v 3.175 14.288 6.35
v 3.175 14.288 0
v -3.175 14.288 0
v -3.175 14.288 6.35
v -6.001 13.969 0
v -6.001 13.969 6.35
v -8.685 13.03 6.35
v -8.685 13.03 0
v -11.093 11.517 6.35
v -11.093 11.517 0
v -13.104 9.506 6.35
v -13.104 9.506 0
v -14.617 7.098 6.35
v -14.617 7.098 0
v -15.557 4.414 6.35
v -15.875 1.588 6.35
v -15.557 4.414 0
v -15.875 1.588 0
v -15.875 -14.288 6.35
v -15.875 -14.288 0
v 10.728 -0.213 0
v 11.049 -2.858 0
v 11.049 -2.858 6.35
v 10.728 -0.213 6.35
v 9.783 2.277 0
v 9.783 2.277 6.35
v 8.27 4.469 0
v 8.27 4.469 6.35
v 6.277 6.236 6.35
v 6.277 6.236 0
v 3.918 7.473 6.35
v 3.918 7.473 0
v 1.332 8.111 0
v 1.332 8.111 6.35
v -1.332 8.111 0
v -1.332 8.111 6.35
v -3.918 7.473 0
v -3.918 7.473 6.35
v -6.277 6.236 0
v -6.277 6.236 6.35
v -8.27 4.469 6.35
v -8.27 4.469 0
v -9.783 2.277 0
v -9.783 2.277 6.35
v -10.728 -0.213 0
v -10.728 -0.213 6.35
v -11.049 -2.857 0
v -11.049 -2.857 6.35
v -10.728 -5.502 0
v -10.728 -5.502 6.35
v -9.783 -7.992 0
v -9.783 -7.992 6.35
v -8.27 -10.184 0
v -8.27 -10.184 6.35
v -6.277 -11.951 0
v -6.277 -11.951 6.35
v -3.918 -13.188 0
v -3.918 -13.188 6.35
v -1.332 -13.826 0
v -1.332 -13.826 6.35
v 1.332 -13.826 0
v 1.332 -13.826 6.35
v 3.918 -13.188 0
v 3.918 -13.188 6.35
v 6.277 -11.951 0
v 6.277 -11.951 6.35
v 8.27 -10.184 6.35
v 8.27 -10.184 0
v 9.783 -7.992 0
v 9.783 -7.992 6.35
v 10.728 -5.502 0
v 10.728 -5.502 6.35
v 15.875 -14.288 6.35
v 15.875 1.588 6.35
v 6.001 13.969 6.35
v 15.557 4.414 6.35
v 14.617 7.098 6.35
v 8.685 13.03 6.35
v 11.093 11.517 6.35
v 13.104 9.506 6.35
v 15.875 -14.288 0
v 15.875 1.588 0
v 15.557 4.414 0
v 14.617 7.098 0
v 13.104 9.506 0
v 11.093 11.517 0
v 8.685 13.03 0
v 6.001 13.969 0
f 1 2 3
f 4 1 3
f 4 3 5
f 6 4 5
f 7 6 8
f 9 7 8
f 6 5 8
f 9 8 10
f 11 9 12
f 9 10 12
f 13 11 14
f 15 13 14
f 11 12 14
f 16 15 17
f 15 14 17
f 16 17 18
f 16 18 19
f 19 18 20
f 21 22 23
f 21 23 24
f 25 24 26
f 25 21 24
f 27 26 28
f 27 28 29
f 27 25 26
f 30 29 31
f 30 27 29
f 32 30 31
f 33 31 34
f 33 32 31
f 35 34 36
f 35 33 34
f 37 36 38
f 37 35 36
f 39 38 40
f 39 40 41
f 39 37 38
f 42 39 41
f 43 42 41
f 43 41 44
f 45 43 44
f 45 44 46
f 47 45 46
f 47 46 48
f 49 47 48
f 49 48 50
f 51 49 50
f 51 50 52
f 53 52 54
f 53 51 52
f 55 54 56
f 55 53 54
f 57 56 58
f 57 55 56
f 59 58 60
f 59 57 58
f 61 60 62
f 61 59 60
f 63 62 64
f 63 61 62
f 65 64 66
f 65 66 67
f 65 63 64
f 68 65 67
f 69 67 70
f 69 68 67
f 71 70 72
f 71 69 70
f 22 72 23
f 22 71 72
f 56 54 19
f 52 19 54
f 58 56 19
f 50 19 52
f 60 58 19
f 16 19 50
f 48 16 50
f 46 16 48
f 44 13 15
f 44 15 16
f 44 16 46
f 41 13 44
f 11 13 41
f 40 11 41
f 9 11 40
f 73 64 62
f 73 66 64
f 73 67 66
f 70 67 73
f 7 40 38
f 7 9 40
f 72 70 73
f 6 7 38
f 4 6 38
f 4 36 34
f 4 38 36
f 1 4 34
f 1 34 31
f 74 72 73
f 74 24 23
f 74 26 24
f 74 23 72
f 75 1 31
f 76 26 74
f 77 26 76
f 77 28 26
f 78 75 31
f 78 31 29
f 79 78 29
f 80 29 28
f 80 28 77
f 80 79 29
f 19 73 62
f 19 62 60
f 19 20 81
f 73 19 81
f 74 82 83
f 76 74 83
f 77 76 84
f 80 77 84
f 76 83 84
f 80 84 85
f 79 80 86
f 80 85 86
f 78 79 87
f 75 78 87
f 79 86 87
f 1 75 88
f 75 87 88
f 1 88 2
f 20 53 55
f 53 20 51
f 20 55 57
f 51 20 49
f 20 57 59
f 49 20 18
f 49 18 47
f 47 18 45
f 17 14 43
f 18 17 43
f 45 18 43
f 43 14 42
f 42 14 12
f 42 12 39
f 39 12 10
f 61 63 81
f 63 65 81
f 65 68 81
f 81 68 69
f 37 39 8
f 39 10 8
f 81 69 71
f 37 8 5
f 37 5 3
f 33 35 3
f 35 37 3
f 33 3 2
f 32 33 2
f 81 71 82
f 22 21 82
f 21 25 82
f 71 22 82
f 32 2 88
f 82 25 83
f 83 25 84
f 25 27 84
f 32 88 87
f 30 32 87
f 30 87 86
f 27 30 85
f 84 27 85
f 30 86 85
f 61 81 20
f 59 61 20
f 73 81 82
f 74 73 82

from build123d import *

# Parameters (mm, degrees)
SKETCH1_R           = 11.049
BOSS_EXTRUDE3_DEPTH = 6.35


with BuildPart() as part:
    # Sketch1 → Boss-Extrude3 (new body)
    with BuildSketch(Plane.XY):
        with BuildLine():
            Line((-15.875, -14.2875), (15.875, -14.2875))
            Line((15.875, -14.2875), (15.875, 1.5875))
            ThreePointArc((15.875, 1.5875), (12.155256121, 10.567756121), (3.175, 14.2875))
            Line((3.175, 14.2875), (-3.175, 14.2875))
            ThreePointArc((-3.175, 14.2875), (-12.155256121, 10.567756121), (-15.875, 1.5875))
            Line((-15.875, 1.5875), (-15.875, -14.2875))
        make_face()
        with Locations((0, -2.8575)):
            Circle(SKETCH1_R, mode=Mode.SUBTRACT)
    extrude(amount=BOSS_EXTRUDE3_DEPTH)


solid = part.part
